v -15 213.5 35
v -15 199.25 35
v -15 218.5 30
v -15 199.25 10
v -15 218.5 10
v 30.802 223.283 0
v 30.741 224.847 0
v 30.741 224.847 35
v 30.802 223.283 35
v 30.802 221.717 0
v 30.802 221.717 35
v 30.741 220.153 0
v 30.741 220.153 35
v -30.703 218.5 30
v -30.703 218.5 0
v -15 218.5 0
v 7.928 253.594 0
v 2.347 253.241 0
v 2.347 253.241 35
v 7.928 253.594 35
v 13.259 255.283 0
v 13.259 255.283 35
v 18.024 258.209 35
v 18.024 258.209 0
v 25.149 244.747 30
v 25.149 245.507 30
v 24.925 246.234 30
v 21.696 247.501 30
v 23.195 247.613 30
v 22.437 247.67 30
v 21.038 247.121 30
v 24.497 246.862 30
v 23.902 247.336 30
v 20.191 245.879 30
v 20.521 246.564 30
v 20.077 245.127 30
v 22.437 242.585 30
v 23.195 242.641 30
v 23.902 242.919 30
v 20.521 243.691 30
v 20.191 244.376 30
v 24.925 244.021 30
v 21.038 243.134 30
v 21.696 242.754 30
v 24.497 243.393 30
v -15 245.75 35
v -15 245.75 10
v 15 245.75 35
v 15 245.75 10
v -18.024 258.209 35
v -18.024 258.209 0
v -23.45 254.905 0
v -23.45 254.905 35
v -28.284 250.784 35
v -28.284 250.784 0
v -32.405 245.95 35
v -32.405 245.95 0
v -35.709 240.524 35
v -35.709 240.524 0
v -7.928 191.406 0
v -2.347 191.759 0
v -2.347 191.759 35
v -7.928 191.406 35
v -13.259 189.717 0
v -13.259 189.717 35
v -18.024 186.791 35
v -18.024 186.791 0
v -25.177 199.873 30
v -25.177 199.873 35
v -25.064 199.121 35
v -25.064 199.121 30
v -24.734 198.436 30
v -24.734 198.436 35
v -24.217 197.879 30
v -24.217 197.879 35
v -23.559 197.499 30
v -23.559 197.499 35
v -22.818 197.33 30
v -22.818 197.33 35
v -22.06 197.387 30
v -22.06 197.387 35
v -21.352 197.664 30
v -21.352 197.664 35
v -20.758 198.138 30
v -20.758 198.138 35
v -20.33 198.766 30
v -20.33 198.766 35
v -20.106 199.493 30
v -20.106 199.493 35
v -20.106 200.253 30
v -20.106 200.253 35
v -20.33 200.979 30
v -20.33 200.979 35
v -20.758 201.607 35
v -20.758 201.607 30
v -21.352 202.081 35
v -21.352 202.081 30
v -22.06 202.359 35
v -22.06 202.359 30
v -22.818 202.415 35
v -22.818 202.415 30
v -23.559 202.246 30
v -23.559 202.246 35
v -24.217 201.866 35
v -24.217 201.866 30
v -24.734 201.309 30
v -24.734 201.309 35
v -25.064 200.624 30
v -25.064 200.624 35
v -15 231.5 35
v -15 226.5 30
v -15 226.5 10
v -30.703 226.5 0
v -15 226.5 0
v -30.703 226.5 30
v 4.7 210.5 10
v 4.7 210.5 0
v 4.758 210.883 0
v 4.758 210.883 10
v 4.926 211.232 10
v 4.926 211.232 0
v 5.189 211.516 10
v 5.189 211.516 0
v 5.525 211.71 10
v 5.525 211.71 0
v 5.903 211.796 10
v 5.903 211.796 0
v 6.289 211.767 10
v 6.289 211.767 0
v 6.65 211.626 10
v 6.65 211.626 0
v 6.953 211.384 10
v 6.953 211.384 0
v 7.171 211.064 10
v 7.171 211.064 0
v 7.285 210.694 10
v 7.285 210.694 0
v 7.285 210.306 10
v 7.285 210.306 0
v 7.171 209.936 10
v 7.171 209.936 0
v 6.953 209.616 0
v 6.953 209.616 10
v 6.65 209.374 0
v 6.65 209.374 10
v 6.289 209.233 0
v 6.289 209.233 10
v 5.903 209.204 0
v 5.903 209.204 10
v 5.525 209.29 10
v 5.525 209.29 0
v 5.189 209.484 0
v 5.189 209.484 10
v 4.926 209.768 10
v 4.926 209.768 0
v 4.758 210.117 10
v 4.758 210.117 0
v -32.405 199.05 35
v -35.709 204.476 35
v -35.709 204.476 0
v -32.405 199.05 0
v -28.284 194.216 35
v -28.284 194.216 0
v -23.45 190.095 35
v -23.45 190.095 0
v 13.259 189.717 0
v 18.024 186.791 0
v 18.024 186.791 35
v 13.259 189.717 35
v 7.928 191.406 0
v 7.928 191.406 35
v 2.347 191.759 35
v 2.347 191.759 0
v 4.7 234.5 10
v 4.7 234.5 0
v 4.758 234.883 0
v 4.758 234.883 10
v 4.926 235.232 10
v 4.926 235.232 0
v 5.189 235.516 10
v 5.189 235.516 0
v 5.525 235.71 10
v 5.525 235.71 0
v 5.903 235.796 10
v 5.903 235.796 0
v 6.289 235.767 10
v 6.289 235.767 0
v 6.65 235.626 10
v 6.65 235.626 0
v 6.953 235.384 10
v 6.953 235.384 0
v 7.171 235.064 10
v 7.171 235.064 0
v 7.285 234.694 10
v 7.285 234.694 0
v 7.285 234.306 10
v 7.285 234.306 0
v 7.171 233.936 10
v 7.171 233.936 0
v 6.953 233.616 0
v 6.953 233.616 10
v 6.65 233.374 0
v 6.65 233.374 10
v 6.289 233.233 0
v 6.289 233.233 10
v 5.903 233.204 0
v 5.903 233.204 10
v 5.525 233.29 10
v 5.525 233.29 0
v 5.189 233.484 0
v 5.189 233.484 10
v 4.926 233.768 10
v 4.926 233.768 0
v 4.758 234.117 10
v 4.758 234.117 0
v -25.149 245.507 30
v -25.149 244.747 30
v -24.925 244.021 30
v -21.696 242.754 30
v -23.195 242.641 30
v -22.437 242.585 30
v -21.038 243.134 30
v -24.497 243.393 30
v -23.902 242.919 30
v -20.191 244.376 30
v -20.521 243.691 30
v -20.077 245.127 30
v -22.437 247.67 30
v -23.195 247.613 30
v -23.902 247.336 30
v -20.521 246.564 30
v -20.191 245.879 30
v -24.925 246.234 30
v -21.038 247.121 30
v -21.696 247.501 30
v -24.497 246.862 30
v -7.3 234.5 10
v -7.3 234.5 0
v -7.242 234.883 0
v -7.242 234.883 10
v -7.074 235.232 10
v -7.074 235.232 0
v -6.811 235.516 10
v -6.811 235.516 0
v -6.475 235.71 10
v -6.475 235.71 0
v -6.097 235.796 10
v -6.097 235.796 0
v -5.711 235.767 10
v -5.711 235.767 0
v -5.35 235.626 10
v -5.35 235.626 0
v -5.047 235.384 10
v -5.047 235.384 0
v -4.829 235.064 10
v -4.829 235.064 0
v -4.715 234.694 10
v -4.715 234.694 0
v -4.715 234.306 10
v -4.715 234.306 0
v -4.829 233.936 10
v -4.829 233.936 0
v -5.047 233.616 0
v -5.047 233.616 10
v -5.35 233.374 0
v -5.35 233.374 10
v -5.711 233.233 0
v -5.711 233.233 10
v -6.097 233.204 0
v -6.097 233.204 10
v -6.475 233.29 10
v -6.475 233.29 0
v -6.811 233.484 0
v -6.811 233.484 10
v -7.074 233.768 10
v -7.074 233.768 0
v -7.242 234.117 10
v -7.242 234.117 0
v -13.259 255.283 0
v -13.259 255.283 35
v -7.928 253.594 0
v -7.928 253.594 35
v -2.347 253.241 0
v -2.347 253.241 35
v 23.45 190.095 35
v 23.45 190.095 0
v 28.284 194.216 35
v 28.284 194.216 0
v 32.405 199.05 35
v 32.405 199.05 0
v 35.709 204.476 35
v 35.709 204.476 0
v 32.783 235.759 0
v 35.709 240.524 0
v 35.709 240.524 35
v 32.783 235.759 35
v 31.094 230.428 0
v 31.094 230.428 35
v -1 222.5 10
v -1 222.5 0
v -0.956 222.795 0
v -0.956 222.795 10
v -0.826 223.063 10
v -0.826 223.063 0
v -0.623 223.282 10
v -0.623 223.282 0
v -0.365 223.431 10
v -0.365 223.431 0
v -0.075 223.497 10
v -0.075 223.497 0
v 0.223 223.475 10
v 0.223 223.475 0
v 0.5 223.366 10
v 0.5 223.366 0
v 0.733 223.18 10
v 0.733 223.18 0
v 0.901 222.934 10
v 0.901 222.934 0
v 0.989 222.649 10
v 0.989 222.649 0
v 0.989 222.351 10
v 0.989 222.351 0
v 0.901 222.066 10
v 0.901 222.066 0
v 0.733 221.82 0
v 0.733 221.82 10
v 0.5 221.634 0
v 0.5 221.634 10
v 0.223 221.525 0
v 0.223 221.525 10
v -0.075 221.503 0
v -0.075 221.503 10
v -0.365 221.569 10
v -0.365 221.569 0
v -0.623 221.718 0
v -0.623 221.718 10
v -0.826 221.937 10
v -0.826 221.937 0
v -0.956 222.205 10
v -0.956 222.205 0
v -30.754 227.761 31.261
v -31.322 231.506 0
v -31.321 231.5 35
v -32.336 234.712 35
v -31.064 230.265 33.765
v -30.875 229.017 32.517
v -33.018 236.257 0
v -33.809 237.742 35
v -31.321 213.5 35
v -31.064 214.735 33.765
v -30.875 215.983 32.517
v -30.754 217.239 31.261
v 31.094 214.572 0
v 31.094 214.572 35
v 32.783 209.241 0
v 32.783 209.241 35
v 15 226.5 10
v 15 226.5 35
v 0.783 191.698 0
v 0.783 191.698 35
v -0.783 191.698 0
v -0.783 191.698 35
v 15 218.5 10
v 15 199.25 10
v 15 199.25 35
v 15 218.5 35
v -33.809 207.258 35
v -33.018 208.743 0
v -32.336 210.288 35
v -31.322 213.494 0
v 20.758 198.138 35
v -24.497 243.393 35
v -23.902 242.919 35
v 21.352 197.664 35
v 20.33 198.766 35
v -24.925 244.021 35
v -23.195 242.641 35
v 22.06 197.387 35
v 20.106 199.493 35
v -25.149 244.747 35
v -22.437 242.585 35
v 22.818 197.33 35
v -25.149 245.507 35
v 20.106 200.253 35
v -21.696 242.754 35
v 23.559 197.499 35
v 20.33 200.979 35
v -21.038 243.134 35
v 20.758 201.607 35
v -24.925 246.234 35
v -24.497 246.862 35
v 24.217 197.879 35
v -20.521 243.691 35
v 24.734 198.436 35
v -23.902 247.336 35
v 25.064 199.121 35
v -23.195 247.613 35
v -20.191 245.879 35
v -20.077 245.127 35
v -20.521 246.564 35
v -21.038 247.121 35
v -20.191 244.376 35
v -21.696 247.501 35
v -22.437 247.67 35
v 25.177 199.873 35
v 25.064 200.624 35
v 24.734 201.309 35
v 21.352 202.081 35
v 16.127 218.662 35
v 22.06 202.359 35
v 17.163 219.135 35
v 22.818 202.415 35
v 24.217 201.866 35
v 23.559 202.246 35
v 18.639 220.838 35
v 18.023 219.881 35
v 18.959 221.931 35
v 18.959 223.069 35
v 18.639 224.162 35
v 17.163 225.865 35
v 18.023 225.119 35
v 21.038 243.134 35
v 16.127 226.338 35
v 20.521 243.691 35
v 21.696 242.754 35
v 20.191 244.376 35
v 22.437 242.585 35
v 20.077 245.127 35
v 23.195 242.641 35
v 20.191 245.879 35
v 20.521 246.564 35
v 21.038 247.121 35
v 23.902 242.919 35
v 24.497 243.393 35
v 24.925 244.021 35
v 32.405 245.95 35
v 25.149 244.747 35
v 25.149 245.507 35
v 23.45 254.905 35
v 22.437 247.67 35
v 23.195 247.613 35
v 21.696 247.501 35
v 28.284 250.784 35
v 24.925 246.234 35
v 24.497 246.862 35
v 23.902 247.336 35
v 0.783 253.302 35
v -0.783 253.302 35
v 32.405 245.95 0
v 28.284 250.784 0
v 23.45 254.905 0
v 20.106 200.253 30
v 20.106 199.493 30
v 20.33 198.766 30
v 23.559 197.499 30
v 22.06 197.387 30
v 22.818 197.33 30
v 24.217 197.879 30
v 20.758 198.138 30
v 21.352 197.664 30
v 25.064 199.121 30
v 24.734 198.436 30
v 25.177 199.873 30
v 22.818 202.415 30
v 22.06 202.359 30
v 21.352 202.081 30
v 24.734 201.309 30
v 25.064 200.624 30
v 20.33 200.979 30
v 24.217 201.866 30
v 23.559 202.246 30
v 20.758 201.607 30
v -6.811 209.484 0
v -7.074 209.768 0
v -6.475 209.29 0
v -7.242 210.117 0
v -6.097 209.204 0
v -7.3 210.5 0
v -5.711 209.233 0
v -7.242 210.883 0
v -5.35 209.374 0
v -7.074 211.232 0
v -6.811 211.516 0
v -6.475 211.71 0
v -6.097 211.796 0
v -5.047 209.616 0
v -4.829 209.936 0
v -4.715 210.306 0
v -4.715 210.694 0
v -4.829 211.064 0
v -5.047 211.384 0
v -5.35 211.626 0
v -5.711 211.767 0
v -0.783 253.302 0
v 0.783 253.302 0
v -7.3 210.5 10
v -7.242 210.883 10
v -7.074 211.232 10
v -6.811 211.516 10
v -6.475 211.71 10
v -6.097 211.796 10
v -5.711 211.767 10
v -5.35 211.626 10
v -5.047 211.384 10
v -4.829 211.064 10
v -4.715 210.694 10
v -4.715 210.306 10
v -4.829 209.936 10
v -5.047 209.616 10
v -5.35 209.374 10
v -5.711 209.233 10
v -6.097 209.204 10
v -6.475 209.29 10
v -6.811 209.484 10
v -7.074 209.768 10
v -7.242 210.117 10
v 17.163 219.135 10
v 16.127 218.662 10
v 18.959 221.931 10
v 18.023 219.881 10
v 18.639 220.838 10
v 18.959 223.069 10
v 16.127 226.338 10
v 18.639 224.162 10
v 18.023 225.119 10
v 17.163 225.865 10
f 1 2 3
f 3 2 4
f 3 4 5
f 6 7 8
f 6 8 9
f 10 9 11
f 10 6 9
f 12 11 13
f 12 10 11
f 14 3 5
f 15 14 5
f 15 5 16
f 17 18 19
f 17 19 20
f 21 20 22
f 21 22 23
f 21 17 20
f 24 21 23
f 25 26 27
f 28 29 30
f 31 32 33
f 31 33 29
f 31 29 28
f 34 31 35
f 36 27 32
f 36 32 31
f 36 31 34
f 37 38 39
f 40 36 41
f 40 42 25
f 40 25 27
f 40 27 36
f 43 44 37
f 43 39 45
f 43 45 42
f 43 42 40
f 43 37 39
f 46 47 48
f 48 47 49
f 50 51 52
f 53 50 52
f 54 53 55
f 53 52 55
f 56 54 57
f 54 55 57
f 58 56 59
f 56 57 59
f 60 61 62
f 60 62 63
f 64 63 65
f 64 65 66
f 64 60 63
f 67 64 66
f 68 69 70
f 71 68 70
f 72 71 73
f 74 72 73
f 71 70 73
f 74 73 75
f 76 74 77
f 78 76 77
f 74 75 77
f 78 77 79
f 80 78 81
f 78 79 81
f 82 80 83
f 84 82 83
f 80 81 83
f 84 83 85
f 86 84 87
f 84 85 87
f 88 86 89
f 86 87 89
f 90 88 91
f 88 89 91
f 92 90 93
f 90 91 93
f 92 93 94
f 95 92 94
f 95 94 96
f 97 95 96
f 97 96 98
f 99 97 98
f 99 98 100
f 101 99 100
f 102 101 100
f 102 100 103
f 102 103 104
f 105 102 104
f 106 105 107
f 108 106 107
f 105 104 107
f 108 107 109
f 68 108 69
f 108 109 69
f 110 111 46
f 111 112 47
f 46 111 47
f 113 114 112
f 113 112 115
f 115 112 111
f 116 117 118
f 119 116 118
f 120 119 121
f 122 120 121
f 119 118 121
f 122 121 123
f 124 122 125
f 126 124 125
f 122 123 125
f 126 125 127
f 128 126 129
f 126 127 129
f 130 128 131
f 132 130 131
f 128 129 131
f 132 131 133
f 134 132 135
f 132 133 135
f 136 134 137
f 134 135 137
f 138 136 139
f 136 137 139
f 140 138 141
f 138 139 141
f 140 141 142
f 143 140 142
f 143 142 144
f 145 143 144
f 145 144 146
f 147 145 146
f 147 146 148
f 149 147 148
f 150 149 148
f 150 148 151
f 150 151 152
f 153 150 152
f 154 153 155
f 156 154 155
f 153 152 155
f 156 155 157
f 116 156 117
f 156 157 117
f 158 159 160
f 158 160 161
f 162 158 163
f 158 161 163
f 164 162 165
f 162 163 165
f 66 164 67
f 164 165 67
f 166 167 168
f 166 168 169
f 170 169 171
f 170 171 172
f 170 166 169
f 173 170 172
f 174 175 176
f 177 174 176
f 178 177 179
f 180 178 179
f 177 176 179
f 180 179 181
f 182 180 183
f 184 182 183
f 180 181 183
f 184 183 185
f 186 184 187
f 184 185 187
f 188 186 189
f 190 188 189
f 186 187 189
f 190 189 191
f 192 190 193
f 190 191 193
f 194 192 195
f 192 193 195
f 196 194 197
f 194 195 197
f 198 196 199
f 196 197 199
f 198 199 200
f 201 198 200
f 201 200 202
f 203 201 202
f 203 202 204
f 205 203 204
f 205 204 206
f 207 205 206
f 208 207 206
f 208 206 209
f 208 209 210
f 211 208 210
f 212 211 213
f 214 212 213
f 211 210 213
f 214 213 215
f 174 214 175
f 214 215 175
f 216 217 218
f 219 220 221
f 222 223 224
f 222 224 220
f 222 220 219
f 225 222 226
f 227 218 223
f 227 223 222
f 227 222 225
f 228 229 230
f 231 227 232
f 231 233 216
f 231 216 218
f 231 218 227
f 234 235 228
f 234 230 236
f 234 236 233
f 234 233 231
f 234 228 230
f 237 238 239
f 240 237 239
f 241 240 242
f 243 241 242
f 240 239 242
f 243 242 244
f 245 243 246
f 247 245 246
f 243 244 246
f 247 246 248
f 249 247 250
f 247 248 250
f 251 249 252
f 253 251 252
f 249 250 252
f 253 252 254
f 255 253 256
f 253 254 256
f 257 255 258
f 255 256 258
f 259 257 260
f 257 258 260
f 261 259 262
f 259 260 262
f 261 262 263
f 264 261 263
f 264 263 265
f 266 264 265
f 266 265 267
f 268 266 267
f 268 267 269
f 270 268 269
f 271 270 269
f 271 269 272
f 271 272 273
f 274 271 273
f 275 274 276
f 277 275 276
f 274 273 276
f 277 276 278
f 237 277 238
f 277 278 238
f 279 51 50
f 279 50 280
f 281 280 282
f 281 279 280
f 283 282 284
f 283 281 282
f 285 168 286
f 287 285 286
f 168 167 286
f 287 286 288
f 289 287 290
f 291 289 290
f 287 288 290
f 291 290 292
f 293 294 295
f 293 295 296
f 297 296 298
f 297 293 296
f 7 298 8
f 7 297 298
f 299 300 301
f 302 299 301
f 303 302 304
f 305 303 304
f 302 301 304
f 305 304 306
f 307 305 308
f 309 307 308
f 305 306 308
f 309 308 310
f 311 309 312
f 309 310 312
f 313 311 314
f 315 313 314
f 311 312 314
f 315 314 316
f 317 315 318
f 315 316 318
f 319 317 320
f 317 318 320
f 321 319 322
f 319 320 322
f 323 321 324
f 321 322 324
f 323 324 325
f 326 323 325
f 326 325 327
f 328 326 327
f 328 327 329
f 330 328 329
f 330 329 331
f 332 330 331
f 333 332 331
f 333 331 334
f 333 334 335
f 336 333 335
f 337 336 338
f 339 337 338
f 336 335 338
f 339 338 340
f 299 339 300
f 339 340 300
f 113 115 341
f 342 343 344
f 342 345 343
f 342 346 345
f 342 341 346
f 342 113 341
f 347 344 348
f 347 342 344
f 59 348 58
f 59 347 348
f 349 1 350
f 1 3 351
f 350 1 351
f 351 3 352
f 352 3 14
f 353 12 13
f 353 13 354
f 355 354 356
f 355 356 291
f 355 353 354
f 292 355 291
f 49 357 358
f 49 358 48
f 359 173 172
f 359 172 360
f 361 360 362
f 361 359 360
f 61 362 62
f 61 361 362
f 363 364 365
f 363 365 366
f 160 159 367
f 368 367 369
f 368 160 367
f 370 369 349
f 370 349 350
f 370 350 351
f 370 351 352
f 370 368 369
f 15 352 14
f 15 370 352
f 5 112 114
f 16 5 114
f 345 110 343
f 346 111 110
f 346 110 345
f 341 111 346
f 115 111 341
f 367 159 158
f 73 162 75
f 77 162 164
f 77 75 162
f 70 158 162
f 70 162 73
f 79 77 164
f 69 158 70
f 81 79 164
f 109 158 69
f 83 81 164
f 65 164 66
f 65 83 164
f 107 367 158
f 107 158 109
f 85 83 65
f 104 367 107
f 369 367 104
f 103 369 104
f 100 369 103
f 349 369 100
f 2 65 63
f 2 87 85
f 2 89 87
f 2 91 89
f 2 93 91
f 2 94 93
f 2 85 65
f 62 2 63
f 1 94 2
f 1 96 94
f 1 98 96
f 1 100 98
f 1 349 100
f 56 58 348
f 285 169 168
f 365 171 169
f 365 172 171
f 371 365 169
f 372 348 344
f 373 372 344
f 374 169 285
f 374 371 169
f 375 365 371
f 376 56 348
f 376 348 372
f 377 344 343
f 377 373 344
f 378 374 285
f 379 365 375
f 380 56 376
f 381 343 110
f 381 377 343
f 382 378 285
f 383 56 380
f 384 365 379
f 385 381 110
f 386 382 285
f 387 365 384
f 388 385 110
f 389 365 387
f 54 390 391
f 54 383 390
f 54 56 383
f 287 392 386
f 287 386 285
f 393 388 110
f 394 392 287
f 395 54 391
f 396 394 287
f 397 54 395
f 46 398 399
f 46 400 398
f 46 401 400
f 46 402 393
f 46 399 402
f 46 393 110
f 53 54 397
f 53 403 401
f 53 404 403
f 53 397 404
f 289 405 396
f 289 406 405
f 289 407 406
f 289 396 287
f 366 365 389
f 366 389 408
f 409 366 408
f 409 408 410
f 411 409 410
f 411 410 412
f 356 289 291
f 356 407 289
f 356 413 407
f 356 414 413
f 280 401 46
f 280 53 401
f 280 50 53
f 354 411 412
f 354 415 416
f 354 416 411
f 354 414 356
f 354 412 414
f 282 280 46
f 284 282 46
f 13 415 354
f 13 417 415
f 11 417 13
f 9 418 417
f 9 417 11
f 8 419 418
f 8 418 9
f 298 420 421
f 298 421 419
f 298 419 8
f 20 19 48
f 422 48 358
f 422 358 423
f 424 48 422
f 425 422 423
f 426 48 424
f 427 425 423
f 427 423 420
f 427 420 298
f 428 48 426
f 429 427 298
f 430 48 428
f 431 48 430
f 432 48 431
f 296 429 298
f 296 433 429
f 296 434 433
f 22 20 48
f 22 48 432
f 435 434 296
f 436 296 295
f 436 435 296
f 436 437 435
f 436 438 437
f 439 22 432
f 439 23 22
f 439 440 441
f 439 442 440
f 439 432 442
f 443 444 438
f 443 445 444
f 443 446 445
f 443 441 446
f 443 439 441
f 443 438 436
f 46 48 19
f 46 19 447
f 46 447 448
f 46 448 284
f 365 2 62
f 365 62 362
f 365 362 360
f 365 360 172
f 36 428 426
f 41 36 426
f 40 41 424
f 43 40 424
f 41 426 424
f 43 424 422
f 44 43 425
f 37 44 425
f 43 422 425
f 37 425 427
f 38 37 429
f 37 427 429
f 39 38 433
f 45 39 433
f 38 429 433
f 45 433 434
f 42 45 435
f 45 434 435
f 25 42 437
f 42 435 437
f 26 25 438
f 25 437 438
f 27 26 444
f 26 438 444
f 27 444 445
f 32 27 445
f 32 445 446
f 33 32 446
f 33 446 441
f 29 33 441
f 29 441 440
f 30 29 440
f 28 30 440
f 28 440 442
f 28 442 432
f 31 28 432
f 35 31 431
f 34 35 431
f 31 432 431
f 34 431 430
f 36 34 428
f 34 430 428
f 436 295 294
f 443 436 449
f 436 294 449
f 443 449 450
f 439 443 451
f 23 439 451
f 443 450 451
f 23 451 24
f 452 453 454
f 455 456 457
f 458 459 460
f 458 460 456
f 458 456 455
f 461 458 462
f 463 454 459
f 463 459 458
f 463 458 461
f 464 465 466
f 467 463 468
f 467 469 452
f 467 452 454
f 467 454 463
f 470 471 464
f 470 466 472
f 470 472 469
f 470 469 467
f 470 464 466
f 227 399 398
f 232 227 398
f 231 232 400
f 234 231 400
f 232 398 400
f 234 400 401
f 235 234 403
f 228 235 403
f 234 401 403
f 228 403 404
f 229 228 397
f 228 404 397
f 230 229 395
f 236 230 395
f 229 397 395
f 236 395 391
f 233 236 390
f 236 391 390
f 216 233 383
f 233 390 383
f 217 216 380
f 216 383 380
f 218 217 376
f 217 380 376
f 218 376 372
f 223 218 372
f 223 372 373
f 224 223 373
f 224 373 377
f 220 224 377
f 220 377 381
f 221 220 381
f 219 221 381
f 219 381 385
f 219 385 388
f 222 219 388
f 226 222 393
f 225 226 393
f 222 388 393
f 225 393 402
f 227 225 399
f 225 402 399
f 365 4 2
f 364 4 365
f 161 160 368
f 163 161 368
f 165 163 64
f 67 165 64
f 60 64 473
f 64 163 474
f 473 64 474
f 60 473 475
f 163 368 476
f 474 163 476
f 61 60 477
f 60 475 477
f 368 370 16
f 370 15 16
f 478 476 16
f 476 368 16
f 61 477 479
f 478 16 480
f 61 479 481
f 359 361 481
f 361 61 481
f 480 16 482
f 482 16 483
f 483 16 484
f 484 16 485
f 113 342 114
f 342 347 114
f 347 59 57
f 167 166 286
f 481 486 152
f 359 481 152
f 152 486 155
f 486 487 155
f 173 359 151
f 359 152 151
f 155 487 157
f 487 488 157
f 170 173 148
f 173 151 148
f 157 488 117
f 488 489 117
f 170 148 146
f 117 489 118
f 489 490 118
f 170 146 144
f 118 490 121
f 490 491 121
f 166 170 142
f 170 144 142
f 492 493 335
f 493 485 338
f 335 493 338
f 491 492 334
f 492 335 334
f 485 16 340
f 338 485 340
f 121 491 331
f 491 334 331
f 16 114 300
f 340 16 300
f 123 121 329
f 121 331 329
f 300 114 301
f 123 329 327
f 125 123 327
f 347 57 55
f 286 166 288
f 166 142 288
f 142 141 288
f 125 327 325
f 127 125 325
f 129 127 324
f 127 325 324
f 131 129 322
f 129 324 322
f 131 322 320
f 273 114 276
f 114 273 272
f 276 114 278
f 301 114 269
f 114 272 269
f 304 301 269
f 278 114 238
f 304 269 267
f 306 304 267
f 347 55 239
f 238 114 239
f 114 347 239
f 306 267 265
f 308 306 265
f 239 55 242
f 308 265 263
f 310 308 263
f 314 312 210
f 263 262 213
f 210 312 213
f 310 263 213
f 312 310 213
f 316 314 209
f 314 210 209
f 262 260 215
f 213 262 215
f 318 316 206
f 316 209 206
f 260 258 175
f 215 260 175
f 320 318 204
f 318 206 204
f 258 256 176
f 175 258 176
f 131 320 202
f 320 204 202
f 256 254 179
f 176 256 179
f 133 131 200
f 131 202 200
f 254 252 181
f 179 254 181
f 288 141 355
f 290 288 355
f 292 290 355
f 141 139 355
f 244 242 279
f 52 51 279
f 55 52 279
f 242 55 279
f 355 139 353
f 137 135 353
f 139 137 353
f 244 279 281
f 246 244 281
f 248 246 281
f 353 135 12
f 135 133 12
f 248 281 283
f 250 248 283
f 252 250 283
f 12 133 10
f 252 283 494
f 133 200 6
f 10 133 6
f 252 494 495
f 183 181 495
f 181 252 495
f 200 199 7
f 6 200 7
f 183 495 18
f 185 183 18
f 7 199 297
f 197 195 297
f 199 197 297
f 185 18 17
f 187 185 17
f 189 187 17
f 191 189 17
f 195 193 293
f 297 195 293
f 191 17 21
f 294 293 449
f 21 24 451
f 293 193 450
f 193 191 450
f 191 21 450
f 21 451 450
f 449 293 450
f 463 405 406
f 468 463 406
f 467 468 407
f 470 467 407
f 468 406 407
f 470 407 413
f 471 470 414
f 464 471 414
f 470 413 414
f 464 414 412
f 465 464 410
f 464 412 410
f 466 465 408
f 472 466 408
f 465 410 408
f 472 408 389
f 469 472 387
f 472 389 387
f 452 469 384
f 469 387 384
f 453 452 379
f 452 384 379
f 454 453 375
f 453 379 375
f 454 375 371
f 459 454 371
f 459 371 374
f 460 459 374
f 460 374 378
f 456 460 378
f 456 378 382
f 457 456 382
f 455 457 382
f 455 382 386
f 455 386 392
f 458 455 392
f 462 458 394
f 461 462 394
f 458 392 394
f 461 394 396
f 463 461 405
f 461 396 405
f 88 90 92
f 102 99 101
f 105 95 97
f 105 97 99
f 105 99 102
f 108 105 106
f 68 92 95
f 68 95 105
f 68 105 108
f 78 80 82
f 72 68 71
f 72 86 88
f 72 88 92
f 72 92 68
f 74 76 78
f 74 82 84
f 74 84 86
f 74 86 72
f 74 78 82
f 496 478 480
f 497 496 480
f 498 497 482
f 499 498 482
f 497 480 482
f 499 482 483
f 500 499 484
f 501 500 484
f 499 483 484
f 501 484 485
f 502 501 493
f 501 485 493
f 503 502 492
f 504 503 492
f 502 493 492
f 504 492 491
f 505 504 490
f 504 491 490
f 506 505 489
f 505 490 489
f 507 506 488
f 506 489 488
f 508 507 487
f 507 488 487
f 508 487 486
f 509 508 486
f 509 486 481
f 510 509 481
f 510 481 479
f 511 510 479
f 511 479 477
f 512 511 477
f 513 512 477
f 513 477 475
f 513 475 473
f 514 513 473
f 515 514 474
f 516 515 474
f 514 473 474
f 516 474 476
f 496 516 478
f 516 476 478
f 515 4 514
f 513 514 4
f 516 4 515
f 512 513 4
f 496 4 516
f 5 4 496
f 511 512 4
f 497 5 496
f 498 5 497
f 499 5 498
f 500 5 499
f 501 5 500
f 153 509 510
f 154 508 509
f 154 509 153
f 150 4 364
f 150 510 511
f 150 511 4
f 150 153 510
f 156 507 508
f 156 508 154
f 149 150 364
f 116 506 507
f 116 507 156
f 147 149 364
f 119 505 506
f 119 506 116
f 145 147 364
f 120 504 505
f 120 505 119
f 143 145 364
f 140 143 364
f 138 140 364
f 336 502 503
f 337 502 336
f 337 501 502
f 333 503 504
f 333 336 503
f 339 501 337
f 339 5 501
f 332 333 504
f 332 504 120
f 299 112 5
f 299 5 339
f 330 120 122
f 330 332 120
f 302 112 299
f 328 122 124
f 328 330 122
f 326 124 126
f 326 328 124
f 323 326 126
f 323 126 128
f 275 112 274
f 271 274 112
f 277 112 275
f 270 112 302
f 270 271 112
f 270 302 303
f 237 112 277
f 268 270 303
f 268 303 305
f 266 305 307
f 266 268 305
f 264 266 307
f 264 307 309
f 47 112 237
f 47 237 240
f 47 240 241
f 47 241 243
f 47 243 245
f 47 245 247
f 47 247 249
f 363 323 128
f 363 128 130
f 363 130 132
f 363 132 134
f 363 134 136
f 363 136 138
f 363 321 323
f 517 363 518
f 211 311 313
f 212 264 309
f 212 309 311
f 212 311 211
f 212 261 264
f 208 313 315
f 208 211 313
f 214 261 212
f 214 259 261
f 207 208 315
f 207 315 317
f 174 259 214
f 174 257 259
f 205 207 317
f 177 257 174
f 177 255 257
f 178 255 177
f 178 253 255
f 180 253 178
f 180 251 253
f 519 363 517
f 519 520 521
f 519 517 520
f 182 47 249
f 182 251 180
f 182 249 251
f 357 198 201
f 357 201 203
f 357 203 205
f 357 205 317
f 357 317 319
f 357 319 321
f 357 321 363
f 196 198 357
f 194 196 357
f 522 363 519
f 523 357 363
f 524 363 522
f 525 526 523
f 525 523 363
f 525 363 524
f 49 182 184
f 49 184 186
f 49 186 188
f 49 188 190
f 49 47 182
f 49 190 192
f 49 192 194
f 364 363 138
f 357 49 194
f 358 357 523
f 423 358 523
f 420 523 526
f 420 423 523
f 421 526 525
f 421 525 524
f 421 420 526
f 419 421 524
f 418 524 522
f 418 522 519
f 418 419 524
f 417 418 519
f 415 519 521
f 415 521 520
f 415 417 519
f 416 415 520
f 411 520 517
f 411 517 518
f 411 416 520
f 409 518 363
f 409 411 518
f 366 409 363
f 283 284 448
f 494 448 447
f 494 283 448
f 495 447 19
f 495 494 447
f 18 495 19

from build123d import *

# Parameters (mm, degrees)
SKETCH1_R           = 40
BOSS_EXTRUDE1_DEPTH = 10
SKETCH3_R           = 40
SKETCH3_W           = 30
SKETCH3_H           = 46.499999994
BOSS_EXTRUDE3_DEPTH = 25
CUT_EXTRUDE1_START  = -35
CUT_EXTRUDE1_DEPTH  = 35
SKETCH5_R           = 2.55
CUT_EXTRUDE2_DEPTH  = 5
CUT_EXTRUDE3_DEPTH  = 25
CUT_EXTRUDE4_DEPTH  = 22
SKETCH9_R           = 1
CUT_EXTRUDE5_DEPTH  = 10
SKETCH10_R          = 1.299999998
SKETCH10_R_2        = 1.299999999
SKETCH10_R_3        = 1.3
CUT_EXTRUDE6_DEPTH  = 10
CHAMFER1_SIZE       = 5


with BuildPart() as part:
    # Sketch1 → Boss-Extrude1 (new body)
    with BuildSketch(Plane.XY):
        with Locations((0, 222.499999997)):
            Circle(SKETCH1_R)
    extrude(amount=BOSS_EXTRUDE1_DEPTH)

    # Sketch3 → Boss-Extrude3 (add)
    with BuildSketch(Plane.XY.offset(10)):
        with Locations((0, 222.499999997)):
            Circle(SKETCH3_R)
        with Locations((0, 222.499999997)):
            Rectangle(SKETCH3_W, SKETCH3_H, mode=Mode.SUBTRACT)
    extrude(amount=BOSS_EXTRUDE3_DEPTH)

    # Sketch4 → Cut-Extrude1 (cut)
    with BuildSketch(Plane.XY.offset(35).offset(CUT_EXTRUDE1_START)):
        with BuildLine():
            ThreePointArc((40, 222.499999997), (38.912456167, 231.763949212), (35.708962247, 240.524150885))
            ThreePointArc((35.708962247, 240.524150885), (31.77566454, 233.14486234), (30.74061322, 224.84706751))
            ThreePointArc((30.74061322, 224.84706751), (30.809531665, 222.499999997), (30.74061322, 220.152932484))
            ThreePointArc((30.74061322, 220.152932484), (31.77566454, 211.855137653), (35.708962247, 204.475849108))
            ThreePointArc((35.708962247, 204.475849108), (38.912456167, 213.236050782), (40, 222.499999997))
        make_face()
        with BuildLine():
            ThreePointArc((-2.347067513, 191.759386777), (-10.644862344, 190.724335457), (-18.024150889, 186.79103775))
            ThreePointArc((-18.024150889, 186.79103775), (0, 182.499999997), (18.024150889, 186.79103775))
            ThreePointArc((18.024150889, 186.79103775), (10.644862344, 190.724335457), (2.347067513, 191.759386777))
            ThreePointArc((2.347067513, 191.759386777), (0, 191.690468331), (-2.347067513, 191.759386777))
        make_face()
        with BuildLine():
            ThreePointArc((18.024150889, 258.208962244), (0, 262.499999997), (-18.024150889, 258.208962244))
            ThreePointArc((-18.024150889, 258.208962244), (-10.644862344, 254.275664537), (-2.347067513, 253.240613217))
            ThreePointArc((-2.347067513, 253.240613217), (0, 253.309531662), (2.347067513, 253.240613217))
            ThreePointArc((2.347067513, 253.240613217), (10.644862344, 254.275664537), (18.024150889, 258.208962244))
        make_face()
        with BuildLine():
            ThreePointArc((-30.74061322, 220.152932484), (-30.809531665, 222.499999997), (-30.74061322, 224.84706751))
            ThreePointArc((-30.74061322, 224.84706751), (-31.77566454, 233.14486234), (-35.708962247, 240.524150885))
            ThreePointArc((-35.708962247, 240.524150885), (-40, 222.499999997), (-35.708962247, 204.475849108))
            ThreePointArc((-35.708962247, 204.475849108), (-31.77566454, 211.855137653), (-30.74061322, 220.152932484))
        make_face()
    extrude(amount=CUT_EXTRUDE1_DEPTH, mode=Mode.SUBTRACT)

    # Sketch5 → Cut-Extrude2 (cut)
    with BuildSketch(Plane.XY.offset(35)):
        with Locations((-22.627416998, 245.127416995)):
            Circle(SKETCH5_R)
        with Locations(Location((22.627416998, 245.127416995, 0), (0, 0, 180))):
            Circle(SKETCH5_R)
        with Locations((22.627416998, 199.872582999)):
            Circle(SKETCH5_R)
        with Locations(Location((-22.627416998, 199.872582999, 0), (0, 0, 180))):
            Circle(SKETCH5_R)
    extrude(amount=-CUT_EXTRUDE2_DEPTH, mode=Mode.SUBTRACT)

    # Sketch6 → Cut-Extrude3 (cut)
    with BuildSketch(Plane.XY.offset(35)):
        with BuildLine():
            Line((-15, 218.499999997), (-15, 226.499999997))
            ThreePointArc((-15, 226.499999997), (-19, 222.499999997), (-15, 218.499999997))
        make_face()
        with BuildLine():
            Line((15, 218.499999997), (15, 226.499999997))
            ThreePointArc((15, 226.499999997), (19, 222.499999997), (15, 218.499999997))
        make_face()
    extrude(amount=-CUT_EXTRUDE3_DEPTH, mode=Mode.SUBTRACT)

    # Sketch8 → Cut-Extrude4 (cut)
    with BuildSketch(Plane(origin=(-15, 0, 0), x_dir=(0, 0, -1), z_dir=(1, 0, 0))):
        Polygon((-22, 226.499999997), (-35, 226.499999997), (-35, 218.499999997), (-22, 218.499999997), (0, 218.499999997), (0, 226.499999997), align=None)
    extrude(amount=-CUT_EXTRUDE4_DEPTH, mode=Mode.SUBTRACT)

    # Sketch9 → Cut-Extrude5 (cut)
    with BuildSketch(Plane(origin=(0, 0, 0), x_dir=(-1, 0, 0), z_dir=(0, 0, -1))):
        with Locations((0, 222.499999997)):
            Circle(SKETCH9_R)
    extrude(amount=-CUT_EXTRUDE5_DEPTH, mode=Mode.SUBTRACT)

    # Sketch10 → Cut-Extrude6 (cut)
    with BuildSketch(Plane(origin=(0, 0, 0), x_dir=(-1, 0, 0), z_dir=(0, 0, -1))):
        with Locations((-6, 234.5)):
            Circle(SKETCH10_R)
        with Locations((6, 234.5)):
            Circle(SKETCH10_R_2)
        with Locations((6, 210.499999997)):
            Circle(SKETCH10_R_3)
        with Locations((-6, 210.499999997)):
            Circle(SKETCH10_R_3)
    extrude(amount=-CUT_EXTRUDE6_DEPTH, mode=Mode.SUBTRACT)

    # Chamfer1
    chamfer1_edges = [part.edges().sort_by_distance(p)[0] for p in [
        (-22.851493975, 218.499999997, 35),
        (-22.851493975, 226.499999997, 35),
    ]]
    chamfer(chamfer1_edges, length=CHAMFER1_SIZE)


solid = part.part
